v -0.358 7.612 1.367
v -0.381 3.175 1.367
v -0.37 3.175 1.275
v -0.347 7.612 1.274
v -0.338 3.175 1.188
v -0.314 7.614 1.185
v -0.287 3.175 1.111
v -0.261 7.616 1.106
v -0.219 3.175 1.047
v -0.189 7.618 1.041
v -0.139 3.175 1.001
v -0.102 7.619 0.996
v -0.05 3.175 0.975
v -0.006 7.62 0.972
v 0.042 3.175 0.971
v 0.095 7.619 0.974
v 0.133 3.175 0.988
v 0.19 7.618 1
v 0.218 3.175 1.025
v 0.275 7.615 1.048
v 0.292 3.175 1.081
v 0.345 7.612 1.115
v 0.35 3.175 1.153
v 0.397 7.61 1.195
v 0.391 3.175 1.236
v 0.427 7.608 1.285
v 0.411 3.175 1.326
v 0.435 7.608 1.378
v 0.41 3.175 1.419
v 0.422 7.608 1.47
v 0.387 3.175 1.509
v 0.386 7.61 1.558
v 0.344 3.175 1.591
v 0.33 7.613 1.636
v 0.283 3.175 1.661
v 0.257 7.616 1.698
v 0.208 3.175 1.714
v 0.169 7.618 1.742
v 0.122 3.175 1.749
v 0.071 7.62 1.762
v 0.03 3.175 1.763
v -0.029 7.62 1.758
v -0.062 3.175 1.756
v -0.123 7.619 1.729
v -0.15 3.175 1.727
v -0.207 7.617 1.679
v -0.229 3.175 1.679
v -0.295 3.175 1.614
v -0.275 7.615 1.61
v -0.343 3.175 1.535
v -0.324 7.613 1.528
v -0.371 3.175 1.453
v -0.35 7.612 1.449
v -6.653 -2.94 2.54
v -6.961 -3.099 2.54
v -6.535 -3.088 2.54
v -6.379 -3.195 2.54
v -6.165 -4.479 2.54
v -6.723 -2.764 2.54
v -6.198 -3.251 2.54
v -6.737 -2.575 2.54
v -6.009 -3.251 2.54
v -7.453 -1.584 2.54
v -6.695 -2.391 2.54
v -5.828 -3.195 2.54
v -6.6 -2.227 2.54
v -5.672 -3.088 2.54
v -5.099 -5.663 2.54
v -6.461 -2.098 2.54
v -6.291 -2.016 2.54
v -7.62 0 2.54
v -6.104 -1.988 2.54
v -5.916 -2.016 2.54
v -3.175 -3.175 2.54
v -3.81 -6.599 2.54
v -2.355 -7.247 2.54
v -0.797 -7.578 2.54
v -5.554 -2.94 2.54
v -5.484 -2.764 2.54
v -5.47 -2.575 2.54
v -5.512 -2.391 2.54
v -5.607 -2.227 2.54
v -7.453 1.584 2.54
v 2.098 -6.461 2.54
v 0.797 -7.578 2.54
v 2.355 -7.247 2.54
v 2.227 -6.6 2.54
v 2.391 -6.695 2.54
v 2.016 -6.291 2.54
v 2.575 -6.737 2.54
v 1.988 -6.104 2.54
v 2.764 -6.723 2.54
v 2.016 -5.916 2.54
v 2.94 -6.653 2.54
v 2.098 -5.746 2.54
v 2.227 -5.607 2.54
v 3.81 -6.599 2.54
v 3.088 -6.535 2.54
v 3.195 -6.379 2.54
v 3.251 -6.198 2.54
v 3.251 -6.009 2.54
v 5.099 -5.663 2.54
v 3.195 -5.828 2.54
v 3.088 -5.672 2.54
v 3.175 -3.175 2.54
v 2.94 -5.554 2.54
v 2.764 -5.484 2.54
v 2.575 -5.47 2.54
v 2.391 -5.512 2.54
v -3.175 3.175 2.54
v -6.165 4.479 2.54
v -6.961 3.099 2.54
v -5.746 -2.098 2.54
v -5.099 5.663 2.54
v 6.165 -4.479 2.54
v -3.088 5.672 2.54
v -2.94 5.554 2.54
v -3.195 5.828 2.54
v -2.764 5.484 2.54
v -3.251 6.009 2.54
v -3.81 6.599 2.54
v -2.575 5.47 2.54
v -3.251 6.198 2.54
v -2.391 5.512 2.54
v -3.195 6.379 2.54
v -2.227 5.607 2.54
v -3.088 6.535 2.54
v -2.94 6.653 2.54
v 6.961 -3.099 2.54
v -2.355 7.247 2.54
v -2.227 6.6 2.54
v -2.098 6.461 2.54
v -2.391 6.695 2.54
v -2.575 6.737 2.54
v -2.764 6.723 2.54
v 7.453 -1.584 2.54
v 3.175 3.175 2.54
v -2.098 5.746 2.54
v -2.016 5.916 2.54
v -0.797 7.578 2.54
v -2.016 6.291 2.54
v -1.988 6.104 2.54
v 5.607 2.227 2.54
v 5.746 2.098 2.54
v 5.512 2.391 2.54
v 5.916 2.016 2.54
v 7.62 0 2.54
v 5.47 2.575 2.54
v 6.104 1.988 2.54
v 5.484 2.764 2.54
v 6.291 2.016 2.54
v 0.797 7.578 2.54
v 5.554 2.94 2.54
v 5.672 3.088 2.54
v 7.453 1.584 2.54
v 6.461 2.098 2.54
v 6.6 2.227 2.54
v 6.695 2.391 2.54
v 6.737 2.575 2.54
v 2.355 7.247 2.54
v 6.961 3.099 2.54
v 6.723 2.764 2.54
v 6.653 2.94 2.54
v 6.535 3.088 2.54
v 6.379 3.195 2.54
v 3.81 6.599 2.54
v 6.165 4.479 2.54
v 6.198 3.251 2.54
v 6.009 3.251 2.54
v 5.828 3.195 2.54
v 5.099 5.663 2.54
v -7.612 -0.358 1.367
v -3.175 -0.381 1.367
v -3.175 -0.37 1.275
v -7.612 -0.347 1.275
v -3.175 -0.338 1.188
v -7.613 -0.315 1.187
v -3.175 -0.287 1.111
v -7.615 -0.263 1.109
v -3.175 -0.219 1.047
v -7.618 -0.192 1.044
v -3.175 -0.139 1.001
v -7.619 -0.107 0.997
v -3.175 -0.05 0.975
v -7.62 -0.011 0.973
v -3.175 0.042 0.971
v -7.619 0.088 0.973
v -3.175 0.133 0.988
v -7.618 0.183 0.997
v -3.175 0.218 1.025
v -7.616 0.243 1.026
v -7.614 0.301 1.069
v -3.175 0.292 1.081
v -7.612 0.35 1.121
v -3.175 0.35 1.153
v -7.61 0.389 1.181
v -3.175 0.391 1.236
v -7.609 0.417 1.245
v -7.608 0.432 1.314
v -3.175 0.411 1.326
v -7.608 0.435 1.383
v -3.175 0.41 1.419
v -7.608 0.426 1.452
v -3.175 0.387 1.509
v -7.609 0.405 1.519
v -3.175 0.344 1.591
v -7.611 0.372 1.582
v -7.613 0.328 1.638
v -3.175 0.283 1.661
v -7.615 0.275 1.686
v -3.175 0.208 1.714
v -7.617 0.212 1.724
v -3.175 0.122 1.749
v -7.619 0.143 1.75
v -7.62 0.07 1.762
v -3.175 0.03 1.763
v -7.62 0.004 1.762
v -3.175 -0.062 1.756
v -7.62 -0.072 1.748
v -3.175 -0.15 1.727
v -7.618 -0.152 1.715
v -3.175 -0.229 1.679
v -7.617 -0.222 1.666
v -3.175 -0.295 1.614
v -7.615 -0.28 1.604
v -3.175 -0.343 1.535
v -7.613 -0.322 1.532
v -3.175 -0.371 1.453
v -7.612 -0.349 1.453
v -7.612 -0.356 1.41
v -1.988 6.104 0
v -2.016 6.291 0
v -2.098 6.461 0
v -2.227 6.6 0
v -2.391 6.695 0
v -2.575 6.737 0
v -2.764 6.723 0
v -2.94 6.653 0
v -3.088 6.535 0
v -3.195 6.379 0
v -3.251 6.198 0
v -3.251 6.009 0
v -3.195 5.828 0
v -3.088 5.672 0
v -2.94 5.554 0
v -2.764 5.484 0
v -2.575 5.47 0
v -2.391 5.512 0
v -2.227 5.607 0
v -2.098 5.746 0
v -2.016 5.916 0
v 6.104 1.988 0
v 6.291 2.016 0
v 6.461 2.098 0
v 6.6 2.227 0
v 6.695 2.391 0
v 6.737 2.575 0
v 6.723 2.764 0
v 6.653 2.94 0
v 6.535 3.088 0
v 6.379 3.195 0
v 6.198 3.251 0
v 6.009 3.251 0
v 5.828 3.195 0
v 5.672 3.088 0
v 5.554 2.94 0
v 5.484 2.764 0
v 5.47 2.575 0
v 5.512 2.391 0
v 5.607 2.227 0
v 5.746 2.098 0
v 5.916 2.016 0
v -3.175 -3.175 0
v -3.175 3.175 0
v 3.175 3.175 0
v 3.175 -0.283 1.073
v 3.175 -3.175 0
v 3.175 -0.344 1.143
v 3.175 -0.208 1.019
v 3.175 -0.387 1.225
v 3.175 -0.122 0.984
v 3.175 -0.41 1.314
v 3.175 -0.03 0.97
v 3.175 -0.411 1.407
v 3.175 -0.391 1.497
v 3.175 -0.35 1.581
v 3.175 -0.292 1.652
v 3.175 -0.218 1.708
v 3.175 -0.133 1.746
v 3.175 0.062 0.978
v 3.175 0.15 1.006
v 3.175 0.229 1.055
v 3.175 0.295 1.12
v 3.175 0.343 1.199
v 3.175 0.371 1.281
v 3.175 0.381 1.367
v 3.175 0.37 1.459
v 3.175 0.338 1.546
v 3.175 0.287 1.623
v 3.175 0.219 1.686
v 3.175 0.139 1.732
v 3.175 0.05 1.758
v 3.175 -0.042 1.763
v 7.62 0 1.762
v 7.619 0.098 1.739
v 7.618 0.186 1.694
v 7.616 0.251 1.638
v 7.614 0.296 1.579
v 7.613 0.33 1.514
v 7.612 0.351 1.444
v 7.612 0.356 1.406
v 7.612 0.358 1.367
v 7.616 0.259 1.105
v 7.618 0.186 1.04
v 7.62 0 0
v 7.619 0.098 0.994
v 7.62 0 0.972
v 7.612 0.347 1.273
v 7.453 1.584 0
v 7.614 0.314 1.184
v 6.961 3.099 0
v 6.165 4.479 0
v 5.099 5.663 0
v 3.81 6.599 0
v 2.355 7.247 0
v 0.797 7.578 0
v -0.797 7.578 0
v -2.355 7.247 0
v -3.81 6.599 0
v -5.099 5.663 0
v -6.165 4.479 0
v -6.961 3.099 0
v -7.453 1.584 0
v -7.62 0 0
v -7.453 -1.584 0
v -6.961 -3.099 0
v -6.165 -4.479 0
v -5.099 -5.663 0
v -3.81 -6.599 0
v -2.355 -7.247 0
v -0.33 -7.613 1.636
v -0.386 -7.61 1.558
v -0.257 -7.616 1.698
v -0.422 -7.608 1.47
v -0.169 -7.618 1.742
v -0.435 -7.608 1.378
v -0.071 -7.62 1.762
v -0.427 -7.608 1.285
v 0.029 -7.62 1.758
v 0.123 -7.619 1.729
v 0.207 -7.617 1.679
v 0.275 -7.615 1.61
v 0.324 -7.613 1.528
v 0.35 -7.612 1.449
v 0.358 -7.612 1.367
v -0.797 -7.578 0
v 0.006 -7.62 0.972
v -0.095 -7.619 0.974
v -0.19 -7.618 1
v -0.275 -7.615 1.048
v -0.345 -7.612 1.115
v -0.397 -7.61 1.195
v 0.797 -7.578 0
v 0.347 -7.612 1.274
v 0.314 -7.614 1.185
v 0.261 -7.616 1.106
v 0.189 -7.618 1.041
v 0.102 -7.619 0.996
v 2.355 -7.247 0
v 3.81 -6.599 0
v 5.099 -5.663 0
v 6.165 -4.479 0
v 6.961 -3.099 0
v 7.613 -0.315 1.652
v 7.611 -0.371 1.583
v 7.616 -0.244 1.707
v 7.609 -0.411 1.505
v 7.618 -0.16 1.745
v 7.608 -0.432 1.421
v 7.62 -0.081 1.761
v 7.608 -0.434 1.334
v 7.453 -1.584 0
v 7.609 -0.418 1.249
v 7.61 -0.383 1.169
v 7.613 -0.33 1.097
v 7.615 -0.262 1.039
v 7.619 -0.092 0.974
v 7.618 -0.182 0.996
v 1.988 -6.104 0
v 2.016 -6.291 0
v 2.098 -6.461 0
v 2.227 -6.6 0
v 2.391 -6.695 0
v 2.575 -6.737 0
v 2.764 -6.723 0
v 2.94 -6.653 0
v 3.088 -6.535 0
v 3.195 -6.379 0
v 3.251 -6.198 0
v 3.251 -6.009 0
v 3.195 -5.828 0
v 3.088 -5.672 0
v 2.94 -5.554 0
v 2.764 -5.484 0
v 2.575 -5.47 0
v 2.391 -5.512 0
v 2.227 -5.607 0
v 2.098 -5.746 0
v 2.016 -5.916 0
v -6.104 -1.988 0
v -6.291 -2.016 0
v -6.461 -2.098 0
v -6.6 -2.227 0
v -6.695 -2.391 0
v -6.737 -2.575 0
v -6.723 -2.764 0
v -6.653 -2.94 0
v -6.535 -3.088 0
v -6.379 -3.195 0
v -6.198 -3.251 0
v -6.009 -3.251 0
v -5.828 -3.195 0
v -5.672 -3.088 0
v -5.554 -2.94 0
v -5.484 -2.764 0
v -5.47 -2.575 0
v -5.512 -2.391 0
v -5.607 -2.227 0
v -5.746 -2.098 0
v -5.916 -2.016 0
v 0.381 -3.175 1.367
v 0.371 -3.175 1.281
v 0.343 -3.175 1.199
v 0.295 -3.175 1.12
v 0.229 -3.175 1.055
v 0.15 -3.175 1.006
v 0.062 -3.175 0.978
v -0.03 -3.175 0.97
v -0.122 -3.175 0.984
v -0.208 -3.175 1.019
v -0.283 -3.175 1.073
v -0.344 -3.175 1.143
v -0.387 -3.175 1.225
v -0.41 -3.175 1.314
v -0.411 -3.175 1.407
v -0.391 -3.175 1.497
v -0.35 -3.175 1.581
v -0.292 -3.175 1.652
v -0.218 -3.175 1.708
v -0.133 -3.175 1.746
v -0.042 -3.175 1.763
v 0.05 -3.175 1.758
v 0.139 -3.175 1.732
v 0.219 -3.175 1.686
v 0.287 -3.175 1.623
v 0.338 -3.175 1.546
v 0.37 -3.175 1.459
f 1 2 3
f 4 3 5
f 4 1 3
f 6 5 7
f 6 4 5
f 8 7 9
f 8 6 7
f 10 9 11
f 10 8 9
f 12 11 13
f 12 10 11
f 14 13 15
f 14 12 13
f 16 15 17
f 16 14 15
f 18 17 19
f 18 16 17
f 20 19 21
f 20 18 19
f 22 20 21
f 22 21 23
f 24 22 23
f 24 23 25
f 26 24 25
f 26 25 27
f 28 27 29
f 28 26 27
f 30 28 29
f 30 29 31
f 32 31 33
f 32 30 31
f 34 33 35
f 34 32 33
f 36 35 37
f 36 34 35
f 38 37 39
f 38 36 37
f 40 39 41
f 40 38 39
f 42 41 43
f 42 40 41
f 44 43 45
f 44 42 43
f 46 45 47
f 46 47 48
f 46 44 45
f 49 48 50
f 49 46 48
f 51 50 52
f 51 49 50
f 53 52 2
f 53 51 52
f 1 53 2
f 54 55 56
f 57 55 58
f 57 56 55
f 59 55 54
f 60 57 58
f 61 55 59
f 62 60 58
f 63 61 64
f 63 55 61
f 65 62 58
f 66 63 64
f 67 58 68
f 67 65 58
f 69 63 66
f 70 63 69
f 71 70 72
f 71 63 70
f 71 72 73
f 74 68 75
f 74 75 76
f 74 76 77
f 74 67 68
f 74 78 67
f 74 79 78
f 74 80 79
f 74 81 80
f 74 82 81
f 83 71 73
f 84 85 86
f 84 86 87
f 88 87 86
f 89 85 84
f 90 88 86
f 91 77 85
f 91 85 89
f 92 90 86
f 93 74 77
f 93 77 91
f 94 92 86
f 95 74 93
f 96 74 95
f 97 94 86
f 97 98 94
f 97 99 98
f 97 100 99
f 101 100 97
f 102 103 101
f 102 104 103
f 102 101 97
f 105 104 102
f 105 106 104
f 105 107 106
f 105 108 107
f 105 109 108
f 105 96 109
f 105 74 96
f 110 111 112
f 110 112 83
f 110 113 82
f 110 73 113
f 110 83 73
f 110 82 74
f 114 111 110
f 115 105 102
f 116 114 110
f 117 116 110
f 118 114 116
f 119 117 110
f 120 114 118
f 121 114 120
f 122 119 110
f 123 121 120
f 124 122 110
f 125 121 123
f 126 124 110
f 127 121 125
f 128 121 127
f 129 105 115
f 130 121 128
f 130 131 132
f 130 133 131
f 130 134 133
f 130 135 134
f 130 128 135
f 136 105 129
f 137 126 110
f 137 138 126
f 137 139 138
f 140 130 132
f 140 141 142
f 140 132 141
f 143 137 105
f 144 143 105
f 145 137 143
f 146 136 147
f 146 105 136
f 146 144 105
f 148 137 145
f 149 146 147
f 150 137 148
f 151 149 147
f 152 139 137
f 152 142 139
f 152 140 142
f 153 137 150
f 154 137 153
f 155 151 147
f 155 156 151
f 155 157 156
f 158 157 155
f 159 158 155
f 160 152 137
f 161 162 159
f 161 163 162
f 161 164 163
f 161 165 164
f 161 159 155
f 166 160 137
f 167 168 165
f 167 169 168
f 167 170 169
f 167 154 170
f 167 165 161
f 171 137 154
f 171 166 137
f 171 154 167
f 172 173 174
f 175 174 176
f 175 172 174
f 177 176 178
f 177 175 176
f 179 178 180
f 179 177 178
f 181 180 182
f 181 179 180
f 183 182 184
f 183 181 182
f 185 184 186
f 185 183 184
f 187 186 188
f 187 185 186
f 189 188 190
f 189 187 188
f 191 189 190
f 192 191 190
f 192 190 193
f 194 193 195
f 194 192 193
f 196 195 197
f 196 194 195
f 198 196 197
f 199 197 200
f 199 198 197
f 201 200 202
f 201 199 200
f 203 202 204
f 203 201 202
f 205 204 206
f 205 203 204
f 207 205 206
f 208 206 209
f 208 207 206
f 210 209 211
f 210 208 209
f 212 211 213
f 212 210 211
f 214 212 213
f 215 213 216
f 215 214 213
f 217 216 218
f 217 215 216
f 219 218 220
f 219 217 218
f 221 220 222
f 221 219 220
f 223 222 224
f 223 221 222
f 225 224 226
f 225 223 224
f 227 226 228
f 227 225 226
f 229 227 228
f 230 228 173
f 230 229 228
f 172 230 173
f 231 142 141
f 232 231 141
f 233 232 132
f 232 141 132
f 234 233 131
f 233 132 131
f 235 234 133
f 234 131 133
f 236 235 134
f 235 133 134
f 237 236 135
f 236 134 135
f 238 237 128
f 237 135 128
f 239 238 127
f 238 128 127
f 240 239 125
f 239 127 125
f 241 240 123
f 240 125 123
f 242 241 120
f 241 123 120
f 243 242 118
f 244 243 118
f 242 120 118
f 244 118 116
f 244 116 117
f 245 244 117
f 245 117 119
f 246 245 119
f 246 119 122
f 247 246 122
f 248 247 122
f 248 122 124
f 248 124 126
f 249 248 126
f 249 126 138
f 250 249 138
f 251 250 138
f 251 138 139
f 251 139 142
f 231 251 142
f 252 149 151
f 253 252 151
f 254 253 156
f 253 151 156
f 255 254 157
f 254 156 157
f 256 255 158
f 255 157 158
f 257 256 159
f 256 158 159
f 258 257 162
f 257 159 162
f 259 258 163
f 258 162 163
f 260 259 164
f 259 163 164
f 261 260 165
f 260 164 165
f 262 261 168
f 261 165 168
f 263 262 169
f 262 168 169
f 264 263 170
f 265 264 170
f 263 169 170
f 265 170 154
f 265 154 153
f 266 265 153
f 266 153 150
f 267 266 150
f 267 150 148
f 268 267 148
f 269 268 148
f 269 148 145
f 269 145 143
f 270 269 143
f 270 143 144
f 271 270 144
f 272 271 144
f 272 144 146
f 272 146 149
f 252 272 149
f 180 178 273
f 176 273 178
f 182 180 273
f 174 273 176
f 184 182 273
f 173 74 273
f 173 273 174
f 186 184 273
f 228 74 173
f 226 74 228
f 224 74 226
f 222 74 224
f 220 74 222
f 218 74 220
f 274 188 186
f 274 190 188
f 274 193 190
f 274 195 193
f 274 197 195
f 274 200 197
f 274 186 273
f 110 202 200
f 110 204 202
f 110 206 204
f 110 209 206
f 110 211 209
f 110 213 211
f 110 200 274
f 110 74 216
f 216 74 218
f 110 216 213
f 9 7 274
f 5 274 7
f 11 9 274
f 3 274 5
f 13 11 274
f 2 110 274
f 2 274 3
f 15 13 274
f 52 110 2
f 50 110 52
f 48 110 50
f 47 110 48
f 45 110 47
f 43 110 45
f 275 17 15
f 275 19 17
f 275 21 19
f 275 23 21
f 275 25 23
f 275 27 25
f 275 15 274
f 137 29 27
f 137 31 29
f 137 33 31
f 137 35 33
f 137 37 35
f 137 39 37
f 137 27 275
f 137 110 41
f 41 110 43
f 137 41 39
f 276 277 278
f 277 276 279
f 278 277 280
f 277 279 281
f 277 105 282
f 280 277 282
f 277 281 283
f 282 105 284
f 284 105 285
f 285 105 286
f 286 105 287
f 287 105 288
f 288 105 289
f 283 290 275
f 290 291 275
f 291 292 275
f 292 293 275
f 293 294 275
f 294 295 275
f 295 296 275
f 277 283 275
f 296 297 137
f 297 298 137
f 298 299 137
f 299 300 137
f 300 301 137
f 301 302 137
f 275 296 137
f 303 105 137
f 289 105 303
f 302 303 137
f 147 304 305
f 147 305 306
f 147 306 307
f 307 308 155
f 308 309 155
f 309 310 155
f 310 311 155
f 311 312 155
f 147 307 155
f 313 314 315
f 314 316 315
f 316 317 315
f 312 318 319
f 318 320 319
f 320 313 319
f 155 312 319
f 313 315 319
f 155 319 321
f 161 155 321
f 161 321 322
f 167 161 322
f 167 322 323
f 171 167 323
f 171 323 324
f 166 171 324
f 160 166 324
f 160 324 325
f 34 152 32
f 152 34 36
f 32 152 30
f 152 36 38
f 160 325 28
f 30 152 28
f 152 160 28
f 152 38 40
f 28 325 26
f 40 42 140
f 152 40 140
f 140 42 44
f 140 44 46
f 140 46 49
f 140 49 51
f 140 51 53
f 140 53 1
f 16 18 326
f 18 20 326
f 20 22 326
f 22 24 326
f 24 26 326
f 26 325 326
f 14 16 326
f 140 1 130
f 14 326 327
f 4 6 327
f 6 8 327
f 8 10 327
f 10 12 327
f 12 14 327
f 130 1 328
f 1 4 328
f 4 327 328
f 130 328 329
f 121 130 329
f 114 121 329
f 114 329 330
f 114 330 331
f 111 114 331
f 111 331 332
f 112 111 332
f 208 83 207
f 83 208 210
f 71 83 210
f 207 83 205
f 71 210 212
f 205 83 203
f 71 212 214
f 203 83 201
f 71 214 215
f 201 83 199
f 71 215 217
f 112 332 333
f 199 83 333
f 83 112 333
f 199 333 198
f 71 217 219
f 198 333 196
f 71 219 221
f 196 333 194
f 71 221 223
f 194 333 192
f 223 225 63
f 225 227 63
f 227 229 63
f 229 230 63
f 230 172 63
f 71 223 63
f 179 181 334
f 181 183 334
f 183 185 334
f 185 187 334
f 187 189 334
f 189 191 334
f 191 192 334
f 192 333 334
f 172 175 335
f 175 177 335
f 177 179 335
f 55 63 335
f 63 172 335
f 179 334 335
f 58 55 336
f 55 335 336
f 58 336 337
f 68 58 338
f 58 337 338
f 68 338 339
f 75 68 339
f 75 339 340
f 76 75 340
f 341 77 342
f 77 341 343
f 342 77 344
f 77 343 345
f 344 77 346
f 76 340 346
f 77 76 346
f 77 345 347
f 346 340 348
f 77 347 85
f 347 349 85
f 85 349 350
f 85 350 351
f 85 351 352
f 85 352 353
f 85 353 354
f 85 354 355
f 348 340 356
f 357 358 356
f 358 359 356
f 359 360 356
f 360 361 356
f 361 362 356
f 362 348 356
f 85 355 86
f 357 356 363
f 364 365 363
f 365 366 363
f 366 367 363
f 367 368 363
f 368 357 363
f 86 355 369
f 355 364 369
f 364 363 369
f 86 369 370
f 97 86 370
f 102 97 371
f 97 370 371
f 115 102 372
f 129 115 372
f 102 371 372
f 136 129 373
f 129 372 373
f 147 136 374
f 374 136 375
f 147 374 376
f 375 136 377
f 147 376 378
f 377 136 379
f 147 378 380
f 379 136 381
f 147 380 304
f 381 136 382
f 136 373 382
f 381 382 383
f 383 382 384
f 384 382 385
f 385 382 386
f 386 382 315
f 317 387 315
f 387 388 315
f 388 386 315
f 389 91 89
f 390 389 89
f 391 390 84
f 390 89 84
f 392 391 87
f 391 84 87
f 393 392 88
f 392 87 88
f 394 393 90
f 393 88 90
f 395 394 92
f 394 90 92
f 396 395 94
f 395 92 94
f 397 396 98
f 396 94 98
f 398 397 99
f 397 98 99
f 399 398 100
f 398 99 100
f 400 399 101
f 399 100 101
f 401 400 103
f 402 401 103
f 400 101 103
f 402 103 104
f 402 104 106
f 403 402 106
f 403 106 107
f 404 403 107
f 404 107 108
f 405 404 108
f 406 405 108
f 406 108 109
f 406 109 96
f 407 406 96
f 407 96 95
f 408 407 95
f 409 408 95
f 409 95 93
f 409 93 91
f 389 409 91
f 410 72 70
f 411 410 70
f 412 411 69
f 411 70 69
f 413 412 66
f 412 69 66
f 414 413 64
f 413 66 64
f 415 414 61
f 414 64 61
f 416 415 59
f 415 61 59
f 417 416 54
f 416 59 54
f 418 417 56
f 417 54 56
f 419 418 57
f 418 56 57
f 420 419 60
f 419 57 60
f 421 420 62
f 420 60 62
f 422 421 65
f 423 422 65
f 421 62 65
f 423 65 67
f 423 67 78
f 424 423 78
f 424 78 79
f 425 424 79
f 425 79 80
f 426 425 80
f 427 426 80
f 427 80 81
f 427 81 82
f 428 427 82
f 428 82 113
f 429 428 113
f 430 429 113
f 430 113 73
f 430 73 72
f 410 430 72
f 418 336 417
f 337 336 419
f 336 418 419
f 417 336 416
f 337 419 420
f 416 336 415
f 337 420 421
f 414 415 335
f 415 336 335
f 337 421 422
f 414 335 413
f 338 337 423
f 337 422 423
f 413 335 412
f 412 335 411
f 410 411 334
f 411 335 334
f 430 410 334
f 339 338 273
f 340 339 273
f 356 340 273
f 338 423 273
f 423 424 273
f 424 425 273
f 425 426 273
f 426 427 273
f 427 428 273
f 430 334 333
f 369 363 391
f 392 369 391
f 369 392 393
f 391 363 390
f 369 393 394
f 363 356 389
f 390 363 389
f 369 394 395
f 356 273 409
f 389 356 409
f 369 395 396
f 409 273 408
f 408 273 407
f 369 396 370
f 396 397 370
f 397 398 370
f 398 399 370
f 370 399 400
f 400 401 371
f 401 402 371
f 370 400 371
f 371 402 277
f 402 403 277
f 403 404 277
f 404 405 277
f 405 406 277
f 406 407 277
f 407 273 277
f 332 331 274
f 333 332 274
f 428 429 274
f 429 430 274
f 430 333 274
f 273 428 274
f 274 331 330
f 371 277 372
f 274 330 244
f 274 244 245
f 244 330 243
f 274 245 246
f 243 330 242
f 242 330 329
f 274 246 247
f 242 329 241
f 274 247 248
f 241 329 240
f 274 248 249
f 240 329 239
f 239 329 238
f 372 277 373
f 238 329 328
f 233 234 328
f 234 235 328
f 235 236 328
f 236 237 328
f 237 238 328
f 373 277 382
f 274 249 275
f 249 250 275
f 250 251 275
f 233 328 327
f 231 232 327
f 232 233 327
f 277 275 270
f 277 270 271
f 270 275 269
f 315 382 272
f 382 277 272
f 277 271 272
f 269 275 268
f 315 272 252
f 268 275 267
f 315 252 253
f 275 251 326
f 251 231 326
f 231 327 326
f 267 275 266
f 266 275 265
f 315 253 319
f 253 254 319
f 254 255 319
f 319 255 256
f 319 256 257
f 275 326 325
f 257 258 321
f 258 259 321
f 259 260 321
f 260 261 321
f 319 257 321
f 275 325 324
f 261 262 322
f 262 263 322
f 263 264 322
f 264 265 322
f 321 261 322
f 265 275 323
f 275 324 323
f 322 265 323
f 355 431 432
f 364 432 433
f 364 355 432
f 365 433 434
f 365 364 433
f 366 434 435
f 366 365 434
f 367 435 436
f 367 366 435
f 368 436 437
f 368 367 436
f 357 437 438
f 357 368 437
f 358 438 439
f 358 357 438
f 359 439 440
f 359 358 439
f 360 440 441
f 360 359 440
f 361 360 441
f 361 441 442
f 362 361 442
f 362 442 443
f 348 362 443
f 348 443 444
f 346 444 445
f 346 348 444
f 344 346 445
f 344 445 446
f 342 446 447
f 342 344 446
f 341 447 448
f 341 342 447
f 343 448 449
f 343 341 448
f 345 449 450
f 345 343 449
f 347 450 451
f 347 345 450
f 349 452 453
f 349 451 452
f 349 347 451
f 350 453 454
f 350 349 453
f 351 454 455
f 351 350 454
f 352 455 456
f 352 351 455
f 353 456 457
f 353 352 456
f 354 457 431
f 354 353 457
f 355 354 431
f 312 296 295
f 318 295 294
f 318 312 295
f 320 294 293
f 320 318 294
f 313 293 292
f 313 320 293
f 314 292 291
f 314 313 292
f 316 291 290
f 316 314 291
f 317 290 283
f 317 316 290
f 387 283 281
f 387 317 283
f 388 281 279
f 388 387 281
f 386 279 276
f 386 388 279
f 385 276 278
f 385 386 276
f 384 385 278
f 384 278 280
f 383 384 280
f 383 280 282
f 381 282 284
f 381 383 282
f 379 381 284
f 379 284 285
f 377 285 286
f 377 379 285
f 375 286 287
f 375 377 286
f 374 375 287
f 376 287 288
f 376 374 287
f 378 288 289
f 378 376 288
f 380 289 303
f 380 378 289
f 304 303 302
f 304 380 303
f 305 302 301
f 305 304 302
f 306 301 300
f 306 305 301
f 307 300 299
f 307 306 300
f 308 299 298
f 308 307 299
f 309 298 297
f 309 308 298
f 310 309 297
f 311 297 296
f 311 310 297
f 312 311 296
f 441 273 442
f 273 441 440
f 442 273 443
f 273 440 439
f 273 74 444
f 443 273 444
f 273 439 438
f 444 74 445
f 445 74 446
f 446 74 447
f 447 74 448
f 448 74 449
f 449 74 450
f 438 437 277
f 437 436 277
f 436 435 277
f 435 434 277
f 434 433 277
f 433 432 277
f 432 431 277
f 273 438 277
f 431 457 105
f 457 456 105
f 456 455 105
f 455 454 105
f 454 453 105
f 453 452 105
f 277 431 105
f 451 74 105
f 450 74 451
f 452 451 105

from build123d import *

# Parameters (mm, degrees)
SKETCH1_R           = 7.62
BOSS_EXTRUDE1_DEPTH = 2.54
SKETCH2_W           = 6.35
SKETCH2_H           = 6.35
CUT_EXTRUDE1_DEPTH  = 12.071603317
SKETCH3_R           = 0.635
CUT_EXTRUDE2_DEPTH  = 12.071603317
CIRPATTERN1_COUNT   = 4
CIRPATTERN2_COUNT   = 4


with BuildPart() as part:
    # Sketch1 → Boss-Extrude1 (new body)
    with BuildSketch(Plane.XY):
        Circle(SKETCH1_R)
    extrude(amount=BOSS_EXTRUDE1_DEPTH)

    # Sketch2 → Cut-Extrude1 (cut, through all)
    with BuildSketch(Plane.XY.offset(2.54)):
        Rectangle(SKETCH2_W, SKETCH2_H)
    extrude(amount=-CUT_EXTRUDE1_DEPTH, mode=Mode.SUBTRACT)

    # Sketch3 → Cut-Extrude2 (cut, through all)
    with BuildSketch(Plane.XY.offset(2.54)):
        with Locations((-2.622739109, 6.103536802)):
            Circle(SKETCH3_R)
    cut_extrude2 = extrude(amount=-CUT_EXTRUDE2_DEPTH, mode=Mode.SUBTRACT)

    # CirPattern1: Cut-Extrude2 ×4 about axis
    cirpattern1_axis = Axis((0, 0, 0), (0, 0, 1))
    for i in range(1, CIRPATTERN1_COUNT):
        add(cut_extrude2.rotate(cirpattern1_axis, i * 360 / CIRPATTERN1_COUNT), mode=Mode.SUBTRACT)

    # Sketch6 → 1/32 (0.03125) Diameter Hole1 (revolve, cut)
    with BuildSketch(Plane(origin=(0.038702284, 7.619901714, 1.36675571), x_dir=(-0.9999871015937097, 0.005079039890736663, 0), z_dir=(0, 0, 1))):
        Polygon((0, 0), (0, 6.683017666), (0.396875, 6.35), (0.396875, 0), align=None)
    f_1_32_0_03125_diameter_hole1 = revolve(axis=Axis((0.070954187, 13.969819809, 1.36675571), (-0.005079039890736664, -0.9999871015937097, 0)), mode=Mode.SUBTRACT)

    # CirPattern2: 1/32 (0.03125) Diameter Hole1 ×4 about axis
    cirpattern2_axis = Axis((0, 0, 2.54), (0, 0, -1))
    for i in range(1, CIRPATTERN2_COUNT):
        add(f_1_32_0_03125_diameter_hole1.rotate(cirpattern2_axis, i * 360 / CIRPATTERN2_COUNT), mode=Mode.SUBTRACT)


solid = part.part
